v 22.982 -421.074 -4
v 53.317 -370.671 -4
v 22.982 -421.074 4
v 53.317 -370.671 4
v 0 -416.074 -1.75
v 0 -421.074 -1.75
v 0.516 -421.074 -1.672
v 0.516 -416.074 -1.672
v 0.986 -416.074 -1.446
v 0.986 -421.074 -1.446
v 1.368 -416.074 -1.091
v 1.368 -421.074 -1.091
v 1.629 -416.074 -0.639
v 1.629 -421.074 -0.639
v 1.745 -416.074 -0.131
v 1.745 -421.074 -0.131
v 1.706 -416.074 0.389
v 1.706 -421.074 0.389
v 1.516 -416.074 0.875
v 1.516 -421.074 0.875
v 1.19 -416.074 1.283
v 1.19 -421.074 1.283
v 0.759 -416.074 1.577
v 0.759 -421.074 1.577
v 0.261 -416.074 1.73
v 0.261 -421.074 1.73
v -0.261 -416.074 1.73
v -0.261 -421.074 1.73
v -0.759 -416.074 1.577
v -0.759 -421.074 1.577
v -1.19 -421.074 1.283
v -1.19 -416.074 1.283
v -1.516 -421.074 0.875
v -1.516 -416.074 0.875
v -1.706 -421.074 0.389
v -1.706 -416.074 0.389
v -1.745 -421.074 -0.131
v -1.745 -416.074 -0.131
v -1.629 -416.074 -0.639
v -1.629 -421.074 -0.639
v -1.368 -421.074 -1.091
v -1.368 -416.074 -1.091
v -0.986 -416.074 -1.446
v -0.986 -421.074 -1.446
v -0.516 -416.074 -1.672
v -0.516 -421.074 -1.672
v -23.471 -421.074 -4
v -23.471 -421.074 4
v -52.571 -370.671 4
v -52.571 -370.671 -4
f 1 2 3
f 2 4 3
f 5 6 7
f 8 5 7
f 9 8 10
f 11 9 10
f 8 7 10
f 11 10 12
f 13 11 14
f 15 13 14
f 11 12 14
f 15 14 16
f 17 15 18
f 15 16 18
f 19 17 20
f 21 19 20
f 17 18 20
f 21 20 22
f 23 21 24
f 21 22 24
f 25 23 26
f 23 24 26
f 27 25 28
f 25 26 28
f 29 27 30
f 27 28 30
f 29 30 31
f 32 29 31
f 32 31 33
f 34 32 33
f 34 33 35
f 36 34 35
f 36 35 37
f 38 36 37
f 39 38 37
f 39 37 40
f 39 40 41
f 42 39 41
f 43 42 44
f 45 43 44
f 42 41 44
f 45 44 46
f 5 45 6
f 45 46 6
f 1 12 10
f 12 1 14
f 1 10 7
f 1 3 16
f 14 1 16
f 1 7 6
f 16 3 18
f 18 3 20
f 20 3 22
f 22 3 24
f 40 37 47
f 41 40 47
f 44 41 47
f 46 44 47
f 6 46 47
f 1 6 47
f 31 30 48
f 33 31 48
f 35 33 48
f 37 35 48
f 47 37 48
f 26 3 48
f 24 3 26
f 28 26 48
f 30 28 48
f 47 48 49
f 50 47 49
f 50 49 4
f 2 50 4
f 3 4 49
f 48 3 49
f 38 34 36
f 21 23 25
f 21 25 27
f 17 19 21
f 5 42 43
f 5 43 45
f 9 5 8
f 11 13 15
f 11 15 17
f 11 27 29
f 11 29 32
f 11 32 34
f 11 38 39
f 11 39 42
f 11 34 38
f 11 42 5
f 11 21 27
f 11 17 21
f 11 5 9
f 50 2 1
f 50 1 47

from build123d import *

# Parameters (mm, degrees)
BOSS_EXTRUDE1_DEPTH = 4
SKETCH6_R           = 1.75
CUT_EXTRUDE1_DEPTH  = 5


with BuildPart() as part:
    # Sketch5 → Boss-Extrude1 (new, symmetric)
    with BuildSketch(Plane.XY):
        Polygon((-52.571031757, -370.671309458), (53.31747051, -370.671309458), (22.981500363, -421.073600557), (-23.471255423, -421.073600557), align=None)
    extrude(amount=BOSS_EXTRUDE1_DEPTH, both=True)

    # Sketch6 → Cut-Extrude1 (cut)
    with BuildSketch(Plane.XZ.offset(421.073600557)):
        with Locations(Location((0, 0, 0), (0, 0, 270))):
            Circle(SKETCH6_R)
    extrude(amount=-CUT_EXTRUDE1_DEPTH, mode=Mode.SUBTRACT)


solid = part.part
